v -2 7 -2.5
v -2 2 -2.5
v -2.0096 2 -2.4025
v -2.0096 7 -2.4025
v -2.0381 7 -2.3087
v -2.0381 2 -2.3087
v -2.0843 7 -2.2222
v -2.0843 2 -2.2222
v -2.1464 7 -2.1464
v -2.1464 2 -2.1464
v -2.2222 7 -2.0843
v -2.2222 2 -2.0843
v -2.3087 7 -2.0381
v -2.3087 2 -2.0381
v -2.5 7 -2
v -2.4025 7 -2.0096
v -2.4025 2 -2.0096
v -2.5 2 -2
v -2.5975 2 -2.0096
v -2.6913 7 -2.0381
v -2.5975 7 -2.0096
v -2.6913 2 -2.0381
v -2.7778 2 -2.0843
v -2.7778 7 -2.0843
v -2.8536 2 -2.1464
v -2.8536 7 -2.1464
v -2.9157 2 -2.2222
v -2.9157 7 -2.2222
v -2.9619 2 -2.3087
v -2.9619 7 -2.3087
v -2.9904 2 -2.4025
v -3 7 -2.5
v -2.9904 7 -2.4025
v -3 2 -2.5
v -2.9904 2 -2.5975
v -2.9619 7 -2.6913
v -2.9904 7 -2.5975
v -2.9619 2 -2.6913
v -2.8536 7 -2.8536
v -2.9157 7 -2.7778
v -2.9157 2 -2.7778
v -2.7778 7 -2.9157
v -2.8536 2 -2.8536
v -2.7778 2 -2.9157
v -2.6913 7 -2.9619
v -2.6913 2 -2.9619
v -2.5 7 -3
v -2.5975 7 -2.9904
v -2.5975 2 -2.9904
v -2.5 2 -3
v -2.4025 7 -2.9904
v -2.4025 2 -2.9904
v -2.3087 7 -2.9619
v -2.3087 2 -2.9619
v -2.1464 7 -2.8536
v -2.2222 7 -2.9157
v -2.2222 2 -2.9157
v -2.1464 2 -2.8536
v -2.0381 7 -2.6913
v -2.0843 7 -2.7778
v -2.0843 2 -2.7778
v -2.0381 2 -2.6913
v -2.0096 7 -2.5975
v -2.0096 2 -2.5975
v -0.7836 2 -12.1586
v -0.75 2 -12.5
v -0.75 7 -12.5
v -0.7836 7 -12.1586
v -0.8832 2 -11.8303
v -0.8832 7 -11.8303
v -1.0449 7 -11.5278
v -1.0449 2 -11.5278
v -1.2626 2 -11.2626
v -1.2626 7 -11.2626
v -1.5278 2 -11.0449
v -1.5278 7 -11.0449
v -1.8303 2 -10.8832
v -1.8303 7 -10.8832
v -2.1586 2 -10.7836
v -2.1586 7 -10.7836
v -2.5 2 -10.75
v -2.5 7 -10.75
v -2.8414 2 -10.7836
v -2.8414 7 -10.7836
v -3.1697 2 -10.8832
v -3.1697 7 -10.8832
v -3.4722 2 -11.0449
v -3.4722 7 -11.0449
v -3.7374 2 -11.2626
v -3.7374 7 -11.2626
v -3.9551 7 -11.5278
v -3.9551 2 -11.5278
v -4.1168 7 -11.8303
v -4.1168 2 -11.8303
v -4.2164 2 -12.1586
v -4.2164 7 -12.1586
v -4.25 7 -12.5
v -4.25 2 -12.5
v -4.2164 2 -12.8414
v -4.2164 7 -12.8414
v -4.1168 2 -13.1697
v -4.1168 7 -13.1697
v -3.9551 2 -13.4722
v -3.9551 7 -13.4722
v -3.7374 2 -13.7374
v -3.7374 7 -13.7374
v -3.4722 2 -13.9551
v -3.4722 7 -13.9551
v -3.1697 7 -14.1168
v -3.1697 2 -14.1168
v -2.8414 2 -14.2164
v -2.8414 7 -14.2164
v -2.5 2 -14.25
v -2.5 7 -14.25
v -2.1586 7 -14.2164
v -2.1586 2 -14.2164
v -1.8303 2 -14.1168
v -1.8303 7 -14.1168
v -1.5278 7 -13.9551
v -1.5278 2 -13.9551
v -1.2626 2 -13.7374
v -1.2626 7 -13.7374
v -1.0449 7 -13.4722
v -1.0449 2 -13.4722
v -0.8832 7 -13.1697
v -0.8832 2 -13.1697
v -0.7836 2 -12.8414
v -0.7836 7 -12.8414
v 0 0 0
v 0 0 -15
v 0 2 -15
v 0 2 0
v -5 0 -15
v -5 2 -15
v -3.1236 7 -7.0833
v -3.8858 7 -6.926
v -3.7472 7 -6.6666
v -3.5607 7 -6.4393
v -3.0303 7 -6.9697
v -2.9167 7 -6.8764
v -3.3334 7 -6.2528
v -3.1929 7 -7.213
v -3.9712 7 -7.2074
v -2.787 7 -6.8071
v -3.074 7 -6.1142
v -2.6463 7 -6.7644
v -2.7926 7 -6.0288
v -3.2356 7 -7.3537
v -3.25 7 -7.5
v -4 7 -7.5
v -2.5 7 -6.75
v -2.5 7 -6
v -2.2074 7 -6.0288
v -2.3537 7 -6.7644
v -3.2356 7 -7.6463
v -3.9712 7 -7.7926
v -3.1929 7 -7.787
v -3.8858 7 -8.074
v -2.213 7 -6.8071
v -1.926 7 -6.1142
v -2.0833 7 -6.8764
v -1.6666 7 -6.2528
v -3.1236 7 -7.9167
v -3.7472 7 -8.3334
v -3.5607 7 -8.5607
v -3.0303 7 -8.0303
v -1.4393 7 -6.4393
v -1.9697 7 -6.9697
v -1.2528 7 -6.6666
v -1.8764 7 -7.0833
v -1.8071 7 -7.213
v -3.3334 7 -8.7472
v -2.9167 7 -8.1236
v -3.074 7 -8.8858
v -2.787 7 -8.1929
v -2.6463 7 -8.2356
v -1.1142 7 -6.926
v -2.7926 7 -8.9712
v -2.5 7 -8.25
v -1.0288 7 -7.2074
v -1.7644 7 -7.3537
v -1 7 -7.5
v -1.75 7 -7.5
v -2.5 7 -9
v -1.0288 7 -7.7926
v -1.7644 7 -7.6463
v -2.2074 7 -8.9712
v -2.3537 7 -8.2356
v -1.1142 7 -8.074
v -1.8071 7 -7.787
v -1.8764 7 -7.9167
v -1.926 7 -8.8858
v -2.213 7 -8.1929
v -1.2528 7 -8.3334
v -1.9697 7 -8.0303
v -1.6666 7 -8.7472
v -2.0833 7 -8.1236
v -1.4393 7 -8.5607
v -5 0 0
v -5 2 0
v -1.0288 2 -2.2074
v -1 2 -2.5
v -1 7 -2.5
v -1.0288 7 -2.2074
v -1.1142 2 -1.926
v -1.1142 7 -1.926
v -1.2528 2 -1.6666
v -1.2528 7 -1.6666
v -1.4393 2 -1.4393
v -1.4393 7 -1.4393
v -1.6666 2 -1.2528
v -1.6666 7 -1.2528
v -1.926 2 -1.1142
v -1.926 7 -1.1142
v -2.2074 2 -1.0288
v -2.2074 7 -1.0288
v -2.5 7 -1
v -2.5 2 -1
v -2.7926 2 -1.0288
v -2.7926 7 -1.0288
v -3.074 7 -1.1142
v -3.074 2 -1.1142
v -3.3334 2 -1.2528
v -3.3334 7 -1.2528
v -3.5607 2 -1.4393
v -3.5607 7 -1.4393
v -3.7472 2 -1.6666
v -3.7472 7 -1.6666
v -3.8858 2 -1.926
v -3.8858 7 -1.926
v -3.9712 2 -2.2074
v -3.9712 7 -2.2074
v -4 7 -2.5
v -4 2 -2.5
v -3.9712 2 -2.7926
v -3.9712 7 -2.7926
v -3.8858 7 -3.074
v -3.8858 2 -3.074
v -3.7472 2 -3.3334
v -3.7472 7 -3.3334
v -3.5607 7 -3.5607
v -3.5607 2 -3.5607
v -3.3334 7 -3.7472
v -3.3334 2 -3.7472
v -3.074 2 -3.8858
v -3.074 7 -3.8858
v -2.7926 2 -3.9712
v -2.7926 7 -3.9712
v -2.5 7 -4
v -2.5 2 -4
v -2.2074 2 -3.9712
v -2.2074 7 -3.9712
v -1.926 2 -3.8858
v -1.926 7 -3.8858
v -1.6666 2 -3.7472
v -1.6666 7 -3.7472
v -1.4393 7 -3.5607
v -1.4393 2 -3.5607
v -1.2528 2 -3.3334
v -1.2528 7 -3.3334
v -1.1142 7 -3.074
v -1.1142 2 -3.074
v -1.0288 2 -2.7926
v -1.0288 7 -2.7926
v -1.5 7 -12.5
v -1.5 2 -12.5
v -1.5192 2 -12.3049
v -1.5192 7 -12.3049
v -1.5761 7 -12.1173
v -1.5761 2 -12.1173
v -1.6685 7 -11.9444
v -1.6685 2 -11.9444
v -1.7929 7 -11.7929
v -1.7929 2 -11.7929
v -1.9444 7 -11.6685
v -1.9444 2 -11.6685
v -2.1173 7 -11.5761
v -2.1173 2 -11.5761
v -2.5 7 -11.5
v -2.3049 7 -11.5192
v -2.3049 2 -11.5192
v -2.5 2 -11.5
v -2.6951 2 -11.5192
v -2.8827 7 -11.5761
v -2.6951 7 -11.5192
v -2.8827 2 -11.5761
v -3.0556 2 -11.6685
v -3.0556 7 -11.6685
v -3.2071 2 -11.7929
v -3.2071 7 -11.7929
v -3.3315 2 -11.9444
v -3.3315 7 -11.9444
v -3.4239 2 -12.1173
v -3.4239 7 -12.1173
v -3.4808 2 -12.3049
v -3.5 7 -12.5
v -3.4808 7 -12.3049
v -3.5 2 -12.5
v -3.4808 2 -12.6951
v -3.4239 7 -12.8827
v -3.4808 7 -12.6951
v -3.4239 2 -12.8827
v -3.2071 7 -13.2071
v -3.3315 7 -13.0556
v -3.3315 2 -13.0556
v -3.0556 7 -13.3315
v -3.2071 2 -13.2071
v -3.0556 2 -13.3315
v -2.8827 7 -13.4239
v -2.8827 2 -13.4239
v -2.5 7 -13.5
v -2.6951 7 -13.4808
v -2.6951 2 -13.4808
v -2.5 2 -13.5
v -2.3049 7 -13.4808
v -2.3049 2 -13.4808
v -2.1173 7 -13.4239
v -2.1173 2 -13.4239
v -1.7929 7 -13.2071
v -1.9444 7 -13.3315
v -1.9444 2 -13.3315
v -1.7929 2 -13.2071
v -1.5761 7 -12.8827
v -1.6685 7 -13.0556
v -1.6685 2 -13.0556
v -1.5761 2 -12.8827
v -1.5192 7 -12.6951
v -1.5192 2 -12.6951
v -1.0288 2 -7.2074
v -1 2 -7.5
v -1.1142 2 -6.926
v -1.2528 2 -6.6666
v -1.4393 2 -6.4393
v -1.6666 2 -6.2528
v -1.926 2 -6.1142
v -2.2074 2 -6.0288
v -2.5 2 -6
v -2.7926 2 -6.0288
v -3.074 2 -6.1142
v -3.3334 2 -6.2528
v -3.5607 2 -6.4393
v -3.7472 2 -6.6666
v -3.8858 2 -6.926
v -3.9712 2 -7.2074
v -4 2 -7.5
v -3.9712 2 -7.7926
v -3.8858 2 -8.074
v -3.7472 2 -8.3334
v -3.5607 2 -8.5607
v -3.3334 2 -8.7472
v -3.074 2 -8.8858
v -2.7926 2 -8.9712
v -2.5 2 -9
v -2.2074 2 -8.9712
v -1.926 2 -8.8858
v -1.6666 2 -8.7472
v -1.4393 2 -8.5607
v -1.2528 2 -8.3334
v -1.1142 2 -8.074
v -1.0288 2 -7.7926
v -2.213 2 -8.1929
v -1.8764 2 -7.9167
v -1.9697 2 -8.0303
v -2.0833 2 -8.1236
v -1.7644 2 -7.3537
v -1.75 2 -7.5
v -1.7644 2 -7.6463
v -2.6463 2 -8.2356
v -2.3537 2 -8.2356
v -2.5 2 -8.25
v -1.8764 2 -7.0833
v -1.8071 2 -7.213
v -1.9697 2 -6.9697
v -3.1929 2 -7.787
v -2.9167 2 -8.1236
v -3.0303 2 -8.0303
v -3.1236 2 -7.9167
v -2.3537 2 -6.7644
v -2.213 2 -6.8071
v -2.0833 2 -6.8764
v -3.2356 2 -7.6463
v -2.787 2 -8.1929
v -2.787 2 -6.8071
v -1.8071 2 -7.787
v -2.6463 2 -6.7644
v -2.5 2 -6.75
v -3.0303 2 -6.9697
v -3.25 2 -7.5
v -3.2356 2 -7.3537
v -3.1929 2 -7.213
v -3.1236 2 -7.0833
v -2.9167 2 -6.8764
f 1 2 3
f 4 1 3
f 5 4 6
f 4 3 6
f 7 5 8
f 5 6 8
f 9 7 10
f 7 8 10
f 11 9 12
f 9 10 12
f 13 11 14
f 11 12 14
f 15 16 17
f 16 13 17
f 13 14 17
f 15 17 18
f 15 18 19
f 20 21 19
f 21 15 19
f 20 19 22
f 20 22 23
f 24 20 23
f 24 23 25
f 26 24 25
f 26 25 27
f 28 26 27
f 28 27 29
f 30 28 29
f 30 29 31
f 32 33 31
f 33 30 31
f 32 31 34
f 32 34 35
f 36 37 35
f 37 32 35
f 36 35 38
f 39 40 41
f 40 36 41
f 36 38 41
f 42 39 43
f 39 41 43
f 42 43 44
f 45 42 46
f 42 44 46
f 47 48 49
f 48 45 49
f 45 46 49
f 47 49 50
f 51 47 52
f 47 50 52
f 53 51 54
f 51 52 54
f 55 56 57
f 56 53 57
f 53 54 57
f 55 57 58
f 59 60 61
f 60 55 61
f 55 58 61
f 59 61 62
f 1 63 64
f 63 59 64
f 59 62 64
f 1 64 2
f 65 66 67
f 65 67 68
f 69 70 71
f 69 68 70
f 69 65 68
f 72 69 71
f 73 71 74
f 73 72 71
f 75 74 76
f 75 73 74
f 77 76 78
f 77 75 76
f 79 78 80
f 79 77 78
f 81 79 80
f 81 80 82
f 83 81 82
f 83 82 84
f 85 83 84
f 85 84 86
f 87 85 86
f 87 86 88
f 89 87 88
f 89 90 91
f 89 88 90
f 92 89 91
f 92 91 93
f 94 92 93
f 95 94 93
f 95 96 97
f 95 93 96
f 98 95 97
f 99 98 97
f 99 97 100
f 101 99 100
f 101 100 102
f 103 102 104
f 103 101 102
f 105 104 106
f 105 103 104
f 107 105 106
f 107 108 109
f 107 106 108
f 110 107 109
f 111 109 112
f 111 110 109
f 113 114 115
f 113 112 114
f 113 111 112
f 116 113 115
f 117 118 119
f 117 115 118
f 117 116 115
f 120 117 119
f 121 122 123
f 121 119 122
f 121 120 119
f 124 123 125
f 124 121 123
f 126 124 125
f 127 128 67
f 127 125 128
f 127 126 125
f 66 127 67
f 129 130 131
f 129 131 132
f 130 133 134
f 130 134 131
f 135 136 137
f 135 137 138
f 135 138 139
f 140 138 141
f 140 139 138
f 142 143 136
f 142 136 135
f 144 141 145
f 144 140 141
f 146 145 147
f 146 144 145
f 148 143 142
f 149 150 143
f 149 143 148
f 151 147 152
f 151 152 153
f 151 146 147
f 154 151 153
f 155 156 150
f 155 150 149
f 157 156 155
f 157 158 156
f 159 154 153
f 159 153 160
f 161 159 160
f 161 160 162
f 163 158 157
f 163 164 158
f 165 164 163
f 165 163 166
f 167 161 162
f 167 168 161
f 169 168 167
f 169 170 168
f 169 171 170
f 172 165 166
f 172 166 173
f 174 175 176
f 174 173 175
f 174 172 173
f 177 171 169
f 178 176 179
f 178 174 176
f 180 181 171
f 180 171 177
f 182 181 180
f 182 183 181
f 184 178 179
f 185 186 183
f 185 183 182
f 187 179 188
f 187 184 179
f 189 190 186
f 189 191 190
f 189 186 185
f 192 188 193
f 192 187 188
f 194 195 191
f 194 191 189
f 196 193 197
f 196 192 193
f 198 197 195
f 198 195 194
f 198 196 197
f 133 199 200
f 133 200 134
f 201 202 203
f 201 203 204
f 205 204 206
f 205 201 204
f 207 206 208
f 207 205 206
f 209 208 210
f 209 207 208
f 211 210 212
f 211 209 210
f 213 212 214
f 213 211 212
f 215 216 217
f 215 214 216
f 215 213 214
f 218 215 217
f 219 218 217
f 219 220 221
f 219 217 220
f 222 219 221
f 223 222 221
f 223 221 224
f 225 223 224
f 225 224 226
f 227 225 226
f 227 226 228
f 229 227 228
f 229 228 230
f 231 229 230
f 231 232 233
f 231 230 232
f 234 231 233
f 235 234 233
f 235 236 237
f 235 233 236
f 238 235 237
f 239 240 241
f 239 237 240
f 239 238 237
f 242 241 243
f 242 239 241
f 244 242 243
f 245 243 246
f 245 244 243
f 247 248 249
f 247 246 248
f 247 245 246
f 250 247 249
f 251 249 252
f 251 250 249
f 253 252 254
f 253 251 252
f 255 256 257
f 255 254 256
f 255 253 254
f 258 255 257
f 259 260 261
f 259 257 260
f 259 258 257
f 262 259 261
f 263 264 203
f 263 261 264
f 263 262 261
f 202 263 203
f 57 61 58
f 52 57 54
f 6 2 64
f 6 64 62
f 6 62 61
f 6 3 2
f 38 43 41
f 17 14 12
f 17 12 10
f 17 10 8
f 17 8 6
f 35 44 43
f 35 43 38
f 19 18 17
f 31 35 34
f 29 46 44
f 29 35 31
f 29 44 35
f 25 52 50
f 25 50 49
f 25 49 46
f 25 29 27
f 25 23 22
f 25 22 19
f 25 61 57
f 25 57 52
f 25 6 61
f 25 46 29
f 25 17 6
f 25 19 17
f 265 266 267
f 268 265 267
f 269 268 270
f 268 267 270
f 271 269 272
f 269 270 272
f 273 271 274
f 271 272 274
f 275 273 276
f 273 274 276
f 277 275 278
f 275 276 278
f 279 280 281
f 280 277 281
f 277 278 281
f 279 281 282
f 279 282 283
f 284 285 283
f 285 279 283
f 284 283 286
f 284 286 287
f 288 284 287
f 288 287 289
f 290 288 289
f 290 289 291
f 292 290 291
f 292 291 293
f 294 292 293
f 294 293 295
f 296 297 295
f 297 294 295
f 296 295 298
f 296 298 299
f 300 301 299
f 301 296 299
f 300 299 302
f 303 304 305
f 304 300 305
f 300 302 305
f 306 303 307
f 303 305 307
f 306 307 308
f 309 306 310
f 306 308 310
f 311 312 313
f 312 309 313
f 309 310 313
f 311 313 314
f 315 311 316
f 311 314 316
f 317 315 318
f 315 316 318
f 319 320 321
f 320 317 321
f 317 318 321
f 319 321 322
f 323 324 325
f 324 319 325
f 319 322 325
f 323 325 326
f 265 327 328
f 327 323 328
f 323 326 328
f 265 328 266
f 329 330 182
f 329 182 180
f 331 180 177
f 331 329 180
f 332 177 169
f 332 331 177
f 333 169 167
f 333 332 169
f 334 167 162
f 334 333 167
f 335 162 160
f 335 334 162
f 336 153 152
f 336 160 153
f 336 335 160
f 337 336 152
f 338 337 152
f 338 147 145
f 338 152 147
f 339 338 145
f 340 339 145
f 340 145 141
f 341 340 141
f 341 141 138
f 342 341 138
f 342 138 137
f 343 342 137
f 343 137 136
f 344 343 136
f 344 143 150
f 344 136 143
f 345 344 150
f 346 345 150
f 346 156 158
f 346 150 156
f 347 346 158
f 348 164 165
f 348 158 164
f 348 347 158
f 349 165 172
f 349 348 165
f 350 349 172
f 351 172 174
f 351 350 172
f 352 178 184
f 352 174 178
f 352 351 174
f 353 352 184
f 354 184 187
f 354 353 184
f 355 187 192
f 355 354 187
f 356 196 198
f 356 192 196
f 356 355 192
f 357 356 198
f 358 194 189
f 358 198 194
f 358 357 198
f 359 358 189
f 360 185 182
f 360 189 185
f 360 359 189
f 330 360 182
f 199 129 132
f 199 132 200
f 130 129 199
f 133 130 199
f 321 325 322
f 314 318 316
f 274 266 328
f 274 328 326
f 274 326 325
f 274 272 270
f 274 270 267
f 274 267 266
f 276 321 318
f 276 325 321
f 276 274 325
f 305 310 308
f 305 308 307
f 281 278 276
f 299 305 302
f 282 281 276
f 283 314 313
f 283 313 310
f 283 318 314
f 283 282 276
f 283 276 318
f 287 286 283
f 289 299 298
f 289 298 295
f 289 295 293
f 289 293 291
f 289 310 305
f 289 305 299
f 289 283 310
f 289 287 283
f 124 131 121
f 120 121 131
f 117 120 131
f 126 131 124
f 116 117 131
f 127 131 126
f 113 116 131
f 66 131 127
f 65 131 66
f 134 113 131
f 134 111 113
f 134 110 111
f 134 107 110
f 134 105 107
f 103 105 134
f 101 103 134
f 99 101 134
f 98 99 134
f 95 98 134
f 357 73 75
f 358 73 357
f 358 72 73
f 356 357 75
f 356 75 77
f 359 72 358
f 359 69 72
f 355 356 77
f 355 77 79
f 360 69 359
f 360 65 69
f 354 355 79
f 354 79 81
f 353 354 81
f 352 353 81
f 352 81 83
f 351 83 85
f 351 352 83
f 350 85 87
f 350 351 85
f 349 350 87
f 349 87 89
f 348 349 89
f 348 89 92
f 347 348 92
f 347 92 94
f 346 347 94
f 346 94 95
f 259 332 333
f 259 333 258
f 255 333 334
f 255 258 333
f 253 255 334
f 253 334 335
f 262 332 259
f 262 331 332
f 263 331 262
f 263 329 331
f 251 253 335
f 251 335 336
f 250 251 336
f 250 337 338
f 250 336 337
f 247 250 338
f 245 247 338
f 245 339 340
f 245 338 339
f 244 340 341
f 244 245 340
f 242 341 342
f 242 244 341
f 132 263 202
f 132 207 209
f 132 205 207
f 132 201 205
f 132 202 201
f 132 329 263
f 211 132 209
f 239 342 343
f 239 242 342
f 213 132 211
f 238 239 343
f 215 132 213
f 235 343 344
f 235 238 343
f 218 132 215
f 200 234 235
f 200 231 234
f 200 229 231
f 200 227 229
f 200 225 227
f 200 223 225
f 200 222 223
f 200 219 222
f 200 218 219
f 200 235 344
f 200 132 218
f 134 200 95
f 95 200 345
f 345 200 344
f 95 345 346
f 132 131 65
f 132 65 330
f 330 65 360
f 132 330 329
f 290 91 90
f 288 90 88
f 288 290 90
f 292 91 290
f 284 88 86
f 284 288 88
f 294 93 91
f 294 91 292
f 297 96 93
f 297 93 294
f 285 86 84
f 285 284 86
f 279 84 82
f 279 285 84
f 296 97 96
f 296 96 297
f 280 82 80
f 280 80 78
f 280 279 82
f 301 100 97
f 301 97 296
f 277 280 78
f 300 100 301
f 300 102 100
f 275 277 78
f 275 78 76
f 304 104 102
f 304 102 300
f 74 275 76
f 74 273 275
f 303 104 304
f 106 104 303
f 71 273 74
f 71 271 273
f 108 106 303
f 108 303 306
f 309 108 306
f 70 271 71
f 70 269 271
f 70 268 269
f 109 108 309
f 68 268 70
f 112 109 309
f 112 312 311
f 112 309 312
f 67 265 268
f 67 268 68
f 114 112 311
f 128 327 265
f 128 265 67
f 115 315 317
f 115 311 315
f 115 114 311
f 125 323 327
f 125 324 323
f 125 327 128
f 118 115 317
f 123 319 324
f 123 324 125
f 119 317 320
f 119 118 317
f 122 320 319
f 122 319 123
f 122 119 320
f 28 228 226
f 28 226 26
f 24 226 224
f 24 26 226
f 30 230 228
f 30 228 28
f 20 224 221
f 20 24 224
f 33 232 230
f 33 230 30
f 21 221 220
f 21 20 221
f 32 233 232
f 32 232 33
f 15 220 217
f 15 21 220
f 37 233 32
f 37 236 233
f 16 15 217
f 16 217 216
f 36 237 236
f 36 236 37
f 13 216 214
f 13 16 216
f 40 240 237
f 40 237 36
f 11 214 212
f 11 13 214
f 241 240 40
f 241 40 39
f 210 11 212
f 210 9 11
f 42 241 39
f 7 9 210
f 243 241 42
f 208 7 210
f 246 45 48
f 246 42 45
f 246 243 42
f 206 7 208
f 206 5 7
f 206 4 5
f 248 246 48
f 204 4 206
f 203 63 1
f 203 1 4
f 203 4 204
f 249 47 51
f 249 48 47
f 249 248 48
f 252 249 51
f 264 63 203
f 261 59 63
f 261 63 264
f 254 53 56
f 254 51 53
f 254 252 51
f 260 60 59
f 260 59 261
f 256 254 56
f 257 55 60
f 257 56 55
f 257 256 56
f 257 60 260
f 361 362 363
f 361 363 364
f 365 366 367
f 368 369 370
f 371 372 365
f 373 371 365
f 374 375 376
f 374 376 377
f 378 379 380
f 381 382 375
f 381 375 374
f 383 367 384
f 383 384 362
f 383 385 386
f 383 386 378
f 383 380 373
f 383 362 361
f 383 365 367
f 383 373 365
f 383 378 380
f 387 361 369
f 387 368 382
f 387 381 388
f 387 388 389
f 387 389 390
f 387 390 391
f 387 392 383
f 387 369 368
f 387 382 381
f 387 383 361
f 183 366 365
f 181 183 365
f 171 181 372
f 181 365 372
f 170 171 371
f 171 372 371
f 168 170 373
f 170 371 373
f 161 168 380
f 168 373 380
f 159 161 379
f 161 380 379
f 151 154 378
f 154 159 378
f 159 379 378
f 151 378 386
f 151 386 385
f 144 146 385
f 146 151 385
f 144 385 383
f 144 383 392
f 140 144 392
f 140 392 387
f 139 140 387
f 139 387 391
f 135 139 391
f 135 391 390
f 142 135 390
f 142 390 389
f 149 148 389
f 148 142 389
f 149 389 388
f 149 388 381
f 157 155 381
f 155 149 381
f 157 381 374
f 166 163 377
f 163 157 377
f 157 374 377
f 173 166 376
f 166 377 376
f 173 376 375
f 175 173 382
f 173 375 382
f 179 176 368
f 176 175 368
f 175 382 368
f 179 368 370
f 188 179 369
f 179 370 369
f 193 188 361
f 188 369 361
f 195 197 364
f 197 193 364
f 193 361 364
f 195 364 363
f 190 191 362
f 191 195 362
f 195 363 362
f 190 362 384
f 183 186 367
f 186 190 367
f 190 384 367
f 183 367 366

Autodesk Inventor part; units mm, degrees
ref_plane "YZ Plane" through (0, 0, 0) normal (1, 0, 0) x (0, 1, 0)
ref_plane "XZ Plane" through (0, 0, 0) normal (0, 1, 0) x (-1, 0, 0)
ref_plane "XY Plane" through (0, 0, 0) normal (0, 0, 1) x (1, 0, 0)
sketch "Sketch1" plane through (0, 0, 0) normal (0, 1, 0) x (-1, 0, 0)
  line L0 (0, 0) -> (5, 0)
  line L1 (5, 0) -> (5, -15)
  line L2 (5, -15) -> (0, -15)
  line L3 (0, -15) -> (0, 0)
  dimension "d0" = 5
  dimension "d1" = 15
extrude "Extrusion1" add sketch "Sketch1" along normal blind 2
sketch "Sketch2" plane through (0, 2, 0) normal (0, 1, 0) x (1, 0, 0)
  line L0 (0, 0) -> (0, 2.5)
  line L1 (0, 2.5) -> (0, 7.5)
  line L2 (0, 7.5) -> (0, 12.5)
  line L3 (0, 2.5) -> (-2.5, 2.5)
  circle A0 centre (-2.5, 2.5) radius 0.5
  circle A1 centre (-2.5, 2.5) radius 1.5
  line L4 (0, 7.5) -> (-2.5, 7.5)
  circle A2 centre (-2.5, 7.5) radius 0.75
  circle A3 centre (-2.5, 7.5) radius 1.5
  line L5 (0, 12.5) -> (-2.5, 12.5)
  circle A4 centre (-2.5, 12.5) radius 1
  circle A5 centre (-2.5, 12.5) radius 1.75
  dimension "d4" = 2.5
  dimension "d5" = 5
  dimension "d6" = 5
  dimension "d7" = 2.5
  dimension "d8" = 1
  dimension "d9" = 3
  dimension "d10" = 2.5
  dimension "d11" = 1.5
  dimension "d12" = 3
  dimension "d13" = 2.5
  dimension "d14" = 2
  dimension "d15" = 3.5
extrude "Extrusion2" add sketch "Sketch2" along normal blind 5
properties part number "HoleSizeTest"
